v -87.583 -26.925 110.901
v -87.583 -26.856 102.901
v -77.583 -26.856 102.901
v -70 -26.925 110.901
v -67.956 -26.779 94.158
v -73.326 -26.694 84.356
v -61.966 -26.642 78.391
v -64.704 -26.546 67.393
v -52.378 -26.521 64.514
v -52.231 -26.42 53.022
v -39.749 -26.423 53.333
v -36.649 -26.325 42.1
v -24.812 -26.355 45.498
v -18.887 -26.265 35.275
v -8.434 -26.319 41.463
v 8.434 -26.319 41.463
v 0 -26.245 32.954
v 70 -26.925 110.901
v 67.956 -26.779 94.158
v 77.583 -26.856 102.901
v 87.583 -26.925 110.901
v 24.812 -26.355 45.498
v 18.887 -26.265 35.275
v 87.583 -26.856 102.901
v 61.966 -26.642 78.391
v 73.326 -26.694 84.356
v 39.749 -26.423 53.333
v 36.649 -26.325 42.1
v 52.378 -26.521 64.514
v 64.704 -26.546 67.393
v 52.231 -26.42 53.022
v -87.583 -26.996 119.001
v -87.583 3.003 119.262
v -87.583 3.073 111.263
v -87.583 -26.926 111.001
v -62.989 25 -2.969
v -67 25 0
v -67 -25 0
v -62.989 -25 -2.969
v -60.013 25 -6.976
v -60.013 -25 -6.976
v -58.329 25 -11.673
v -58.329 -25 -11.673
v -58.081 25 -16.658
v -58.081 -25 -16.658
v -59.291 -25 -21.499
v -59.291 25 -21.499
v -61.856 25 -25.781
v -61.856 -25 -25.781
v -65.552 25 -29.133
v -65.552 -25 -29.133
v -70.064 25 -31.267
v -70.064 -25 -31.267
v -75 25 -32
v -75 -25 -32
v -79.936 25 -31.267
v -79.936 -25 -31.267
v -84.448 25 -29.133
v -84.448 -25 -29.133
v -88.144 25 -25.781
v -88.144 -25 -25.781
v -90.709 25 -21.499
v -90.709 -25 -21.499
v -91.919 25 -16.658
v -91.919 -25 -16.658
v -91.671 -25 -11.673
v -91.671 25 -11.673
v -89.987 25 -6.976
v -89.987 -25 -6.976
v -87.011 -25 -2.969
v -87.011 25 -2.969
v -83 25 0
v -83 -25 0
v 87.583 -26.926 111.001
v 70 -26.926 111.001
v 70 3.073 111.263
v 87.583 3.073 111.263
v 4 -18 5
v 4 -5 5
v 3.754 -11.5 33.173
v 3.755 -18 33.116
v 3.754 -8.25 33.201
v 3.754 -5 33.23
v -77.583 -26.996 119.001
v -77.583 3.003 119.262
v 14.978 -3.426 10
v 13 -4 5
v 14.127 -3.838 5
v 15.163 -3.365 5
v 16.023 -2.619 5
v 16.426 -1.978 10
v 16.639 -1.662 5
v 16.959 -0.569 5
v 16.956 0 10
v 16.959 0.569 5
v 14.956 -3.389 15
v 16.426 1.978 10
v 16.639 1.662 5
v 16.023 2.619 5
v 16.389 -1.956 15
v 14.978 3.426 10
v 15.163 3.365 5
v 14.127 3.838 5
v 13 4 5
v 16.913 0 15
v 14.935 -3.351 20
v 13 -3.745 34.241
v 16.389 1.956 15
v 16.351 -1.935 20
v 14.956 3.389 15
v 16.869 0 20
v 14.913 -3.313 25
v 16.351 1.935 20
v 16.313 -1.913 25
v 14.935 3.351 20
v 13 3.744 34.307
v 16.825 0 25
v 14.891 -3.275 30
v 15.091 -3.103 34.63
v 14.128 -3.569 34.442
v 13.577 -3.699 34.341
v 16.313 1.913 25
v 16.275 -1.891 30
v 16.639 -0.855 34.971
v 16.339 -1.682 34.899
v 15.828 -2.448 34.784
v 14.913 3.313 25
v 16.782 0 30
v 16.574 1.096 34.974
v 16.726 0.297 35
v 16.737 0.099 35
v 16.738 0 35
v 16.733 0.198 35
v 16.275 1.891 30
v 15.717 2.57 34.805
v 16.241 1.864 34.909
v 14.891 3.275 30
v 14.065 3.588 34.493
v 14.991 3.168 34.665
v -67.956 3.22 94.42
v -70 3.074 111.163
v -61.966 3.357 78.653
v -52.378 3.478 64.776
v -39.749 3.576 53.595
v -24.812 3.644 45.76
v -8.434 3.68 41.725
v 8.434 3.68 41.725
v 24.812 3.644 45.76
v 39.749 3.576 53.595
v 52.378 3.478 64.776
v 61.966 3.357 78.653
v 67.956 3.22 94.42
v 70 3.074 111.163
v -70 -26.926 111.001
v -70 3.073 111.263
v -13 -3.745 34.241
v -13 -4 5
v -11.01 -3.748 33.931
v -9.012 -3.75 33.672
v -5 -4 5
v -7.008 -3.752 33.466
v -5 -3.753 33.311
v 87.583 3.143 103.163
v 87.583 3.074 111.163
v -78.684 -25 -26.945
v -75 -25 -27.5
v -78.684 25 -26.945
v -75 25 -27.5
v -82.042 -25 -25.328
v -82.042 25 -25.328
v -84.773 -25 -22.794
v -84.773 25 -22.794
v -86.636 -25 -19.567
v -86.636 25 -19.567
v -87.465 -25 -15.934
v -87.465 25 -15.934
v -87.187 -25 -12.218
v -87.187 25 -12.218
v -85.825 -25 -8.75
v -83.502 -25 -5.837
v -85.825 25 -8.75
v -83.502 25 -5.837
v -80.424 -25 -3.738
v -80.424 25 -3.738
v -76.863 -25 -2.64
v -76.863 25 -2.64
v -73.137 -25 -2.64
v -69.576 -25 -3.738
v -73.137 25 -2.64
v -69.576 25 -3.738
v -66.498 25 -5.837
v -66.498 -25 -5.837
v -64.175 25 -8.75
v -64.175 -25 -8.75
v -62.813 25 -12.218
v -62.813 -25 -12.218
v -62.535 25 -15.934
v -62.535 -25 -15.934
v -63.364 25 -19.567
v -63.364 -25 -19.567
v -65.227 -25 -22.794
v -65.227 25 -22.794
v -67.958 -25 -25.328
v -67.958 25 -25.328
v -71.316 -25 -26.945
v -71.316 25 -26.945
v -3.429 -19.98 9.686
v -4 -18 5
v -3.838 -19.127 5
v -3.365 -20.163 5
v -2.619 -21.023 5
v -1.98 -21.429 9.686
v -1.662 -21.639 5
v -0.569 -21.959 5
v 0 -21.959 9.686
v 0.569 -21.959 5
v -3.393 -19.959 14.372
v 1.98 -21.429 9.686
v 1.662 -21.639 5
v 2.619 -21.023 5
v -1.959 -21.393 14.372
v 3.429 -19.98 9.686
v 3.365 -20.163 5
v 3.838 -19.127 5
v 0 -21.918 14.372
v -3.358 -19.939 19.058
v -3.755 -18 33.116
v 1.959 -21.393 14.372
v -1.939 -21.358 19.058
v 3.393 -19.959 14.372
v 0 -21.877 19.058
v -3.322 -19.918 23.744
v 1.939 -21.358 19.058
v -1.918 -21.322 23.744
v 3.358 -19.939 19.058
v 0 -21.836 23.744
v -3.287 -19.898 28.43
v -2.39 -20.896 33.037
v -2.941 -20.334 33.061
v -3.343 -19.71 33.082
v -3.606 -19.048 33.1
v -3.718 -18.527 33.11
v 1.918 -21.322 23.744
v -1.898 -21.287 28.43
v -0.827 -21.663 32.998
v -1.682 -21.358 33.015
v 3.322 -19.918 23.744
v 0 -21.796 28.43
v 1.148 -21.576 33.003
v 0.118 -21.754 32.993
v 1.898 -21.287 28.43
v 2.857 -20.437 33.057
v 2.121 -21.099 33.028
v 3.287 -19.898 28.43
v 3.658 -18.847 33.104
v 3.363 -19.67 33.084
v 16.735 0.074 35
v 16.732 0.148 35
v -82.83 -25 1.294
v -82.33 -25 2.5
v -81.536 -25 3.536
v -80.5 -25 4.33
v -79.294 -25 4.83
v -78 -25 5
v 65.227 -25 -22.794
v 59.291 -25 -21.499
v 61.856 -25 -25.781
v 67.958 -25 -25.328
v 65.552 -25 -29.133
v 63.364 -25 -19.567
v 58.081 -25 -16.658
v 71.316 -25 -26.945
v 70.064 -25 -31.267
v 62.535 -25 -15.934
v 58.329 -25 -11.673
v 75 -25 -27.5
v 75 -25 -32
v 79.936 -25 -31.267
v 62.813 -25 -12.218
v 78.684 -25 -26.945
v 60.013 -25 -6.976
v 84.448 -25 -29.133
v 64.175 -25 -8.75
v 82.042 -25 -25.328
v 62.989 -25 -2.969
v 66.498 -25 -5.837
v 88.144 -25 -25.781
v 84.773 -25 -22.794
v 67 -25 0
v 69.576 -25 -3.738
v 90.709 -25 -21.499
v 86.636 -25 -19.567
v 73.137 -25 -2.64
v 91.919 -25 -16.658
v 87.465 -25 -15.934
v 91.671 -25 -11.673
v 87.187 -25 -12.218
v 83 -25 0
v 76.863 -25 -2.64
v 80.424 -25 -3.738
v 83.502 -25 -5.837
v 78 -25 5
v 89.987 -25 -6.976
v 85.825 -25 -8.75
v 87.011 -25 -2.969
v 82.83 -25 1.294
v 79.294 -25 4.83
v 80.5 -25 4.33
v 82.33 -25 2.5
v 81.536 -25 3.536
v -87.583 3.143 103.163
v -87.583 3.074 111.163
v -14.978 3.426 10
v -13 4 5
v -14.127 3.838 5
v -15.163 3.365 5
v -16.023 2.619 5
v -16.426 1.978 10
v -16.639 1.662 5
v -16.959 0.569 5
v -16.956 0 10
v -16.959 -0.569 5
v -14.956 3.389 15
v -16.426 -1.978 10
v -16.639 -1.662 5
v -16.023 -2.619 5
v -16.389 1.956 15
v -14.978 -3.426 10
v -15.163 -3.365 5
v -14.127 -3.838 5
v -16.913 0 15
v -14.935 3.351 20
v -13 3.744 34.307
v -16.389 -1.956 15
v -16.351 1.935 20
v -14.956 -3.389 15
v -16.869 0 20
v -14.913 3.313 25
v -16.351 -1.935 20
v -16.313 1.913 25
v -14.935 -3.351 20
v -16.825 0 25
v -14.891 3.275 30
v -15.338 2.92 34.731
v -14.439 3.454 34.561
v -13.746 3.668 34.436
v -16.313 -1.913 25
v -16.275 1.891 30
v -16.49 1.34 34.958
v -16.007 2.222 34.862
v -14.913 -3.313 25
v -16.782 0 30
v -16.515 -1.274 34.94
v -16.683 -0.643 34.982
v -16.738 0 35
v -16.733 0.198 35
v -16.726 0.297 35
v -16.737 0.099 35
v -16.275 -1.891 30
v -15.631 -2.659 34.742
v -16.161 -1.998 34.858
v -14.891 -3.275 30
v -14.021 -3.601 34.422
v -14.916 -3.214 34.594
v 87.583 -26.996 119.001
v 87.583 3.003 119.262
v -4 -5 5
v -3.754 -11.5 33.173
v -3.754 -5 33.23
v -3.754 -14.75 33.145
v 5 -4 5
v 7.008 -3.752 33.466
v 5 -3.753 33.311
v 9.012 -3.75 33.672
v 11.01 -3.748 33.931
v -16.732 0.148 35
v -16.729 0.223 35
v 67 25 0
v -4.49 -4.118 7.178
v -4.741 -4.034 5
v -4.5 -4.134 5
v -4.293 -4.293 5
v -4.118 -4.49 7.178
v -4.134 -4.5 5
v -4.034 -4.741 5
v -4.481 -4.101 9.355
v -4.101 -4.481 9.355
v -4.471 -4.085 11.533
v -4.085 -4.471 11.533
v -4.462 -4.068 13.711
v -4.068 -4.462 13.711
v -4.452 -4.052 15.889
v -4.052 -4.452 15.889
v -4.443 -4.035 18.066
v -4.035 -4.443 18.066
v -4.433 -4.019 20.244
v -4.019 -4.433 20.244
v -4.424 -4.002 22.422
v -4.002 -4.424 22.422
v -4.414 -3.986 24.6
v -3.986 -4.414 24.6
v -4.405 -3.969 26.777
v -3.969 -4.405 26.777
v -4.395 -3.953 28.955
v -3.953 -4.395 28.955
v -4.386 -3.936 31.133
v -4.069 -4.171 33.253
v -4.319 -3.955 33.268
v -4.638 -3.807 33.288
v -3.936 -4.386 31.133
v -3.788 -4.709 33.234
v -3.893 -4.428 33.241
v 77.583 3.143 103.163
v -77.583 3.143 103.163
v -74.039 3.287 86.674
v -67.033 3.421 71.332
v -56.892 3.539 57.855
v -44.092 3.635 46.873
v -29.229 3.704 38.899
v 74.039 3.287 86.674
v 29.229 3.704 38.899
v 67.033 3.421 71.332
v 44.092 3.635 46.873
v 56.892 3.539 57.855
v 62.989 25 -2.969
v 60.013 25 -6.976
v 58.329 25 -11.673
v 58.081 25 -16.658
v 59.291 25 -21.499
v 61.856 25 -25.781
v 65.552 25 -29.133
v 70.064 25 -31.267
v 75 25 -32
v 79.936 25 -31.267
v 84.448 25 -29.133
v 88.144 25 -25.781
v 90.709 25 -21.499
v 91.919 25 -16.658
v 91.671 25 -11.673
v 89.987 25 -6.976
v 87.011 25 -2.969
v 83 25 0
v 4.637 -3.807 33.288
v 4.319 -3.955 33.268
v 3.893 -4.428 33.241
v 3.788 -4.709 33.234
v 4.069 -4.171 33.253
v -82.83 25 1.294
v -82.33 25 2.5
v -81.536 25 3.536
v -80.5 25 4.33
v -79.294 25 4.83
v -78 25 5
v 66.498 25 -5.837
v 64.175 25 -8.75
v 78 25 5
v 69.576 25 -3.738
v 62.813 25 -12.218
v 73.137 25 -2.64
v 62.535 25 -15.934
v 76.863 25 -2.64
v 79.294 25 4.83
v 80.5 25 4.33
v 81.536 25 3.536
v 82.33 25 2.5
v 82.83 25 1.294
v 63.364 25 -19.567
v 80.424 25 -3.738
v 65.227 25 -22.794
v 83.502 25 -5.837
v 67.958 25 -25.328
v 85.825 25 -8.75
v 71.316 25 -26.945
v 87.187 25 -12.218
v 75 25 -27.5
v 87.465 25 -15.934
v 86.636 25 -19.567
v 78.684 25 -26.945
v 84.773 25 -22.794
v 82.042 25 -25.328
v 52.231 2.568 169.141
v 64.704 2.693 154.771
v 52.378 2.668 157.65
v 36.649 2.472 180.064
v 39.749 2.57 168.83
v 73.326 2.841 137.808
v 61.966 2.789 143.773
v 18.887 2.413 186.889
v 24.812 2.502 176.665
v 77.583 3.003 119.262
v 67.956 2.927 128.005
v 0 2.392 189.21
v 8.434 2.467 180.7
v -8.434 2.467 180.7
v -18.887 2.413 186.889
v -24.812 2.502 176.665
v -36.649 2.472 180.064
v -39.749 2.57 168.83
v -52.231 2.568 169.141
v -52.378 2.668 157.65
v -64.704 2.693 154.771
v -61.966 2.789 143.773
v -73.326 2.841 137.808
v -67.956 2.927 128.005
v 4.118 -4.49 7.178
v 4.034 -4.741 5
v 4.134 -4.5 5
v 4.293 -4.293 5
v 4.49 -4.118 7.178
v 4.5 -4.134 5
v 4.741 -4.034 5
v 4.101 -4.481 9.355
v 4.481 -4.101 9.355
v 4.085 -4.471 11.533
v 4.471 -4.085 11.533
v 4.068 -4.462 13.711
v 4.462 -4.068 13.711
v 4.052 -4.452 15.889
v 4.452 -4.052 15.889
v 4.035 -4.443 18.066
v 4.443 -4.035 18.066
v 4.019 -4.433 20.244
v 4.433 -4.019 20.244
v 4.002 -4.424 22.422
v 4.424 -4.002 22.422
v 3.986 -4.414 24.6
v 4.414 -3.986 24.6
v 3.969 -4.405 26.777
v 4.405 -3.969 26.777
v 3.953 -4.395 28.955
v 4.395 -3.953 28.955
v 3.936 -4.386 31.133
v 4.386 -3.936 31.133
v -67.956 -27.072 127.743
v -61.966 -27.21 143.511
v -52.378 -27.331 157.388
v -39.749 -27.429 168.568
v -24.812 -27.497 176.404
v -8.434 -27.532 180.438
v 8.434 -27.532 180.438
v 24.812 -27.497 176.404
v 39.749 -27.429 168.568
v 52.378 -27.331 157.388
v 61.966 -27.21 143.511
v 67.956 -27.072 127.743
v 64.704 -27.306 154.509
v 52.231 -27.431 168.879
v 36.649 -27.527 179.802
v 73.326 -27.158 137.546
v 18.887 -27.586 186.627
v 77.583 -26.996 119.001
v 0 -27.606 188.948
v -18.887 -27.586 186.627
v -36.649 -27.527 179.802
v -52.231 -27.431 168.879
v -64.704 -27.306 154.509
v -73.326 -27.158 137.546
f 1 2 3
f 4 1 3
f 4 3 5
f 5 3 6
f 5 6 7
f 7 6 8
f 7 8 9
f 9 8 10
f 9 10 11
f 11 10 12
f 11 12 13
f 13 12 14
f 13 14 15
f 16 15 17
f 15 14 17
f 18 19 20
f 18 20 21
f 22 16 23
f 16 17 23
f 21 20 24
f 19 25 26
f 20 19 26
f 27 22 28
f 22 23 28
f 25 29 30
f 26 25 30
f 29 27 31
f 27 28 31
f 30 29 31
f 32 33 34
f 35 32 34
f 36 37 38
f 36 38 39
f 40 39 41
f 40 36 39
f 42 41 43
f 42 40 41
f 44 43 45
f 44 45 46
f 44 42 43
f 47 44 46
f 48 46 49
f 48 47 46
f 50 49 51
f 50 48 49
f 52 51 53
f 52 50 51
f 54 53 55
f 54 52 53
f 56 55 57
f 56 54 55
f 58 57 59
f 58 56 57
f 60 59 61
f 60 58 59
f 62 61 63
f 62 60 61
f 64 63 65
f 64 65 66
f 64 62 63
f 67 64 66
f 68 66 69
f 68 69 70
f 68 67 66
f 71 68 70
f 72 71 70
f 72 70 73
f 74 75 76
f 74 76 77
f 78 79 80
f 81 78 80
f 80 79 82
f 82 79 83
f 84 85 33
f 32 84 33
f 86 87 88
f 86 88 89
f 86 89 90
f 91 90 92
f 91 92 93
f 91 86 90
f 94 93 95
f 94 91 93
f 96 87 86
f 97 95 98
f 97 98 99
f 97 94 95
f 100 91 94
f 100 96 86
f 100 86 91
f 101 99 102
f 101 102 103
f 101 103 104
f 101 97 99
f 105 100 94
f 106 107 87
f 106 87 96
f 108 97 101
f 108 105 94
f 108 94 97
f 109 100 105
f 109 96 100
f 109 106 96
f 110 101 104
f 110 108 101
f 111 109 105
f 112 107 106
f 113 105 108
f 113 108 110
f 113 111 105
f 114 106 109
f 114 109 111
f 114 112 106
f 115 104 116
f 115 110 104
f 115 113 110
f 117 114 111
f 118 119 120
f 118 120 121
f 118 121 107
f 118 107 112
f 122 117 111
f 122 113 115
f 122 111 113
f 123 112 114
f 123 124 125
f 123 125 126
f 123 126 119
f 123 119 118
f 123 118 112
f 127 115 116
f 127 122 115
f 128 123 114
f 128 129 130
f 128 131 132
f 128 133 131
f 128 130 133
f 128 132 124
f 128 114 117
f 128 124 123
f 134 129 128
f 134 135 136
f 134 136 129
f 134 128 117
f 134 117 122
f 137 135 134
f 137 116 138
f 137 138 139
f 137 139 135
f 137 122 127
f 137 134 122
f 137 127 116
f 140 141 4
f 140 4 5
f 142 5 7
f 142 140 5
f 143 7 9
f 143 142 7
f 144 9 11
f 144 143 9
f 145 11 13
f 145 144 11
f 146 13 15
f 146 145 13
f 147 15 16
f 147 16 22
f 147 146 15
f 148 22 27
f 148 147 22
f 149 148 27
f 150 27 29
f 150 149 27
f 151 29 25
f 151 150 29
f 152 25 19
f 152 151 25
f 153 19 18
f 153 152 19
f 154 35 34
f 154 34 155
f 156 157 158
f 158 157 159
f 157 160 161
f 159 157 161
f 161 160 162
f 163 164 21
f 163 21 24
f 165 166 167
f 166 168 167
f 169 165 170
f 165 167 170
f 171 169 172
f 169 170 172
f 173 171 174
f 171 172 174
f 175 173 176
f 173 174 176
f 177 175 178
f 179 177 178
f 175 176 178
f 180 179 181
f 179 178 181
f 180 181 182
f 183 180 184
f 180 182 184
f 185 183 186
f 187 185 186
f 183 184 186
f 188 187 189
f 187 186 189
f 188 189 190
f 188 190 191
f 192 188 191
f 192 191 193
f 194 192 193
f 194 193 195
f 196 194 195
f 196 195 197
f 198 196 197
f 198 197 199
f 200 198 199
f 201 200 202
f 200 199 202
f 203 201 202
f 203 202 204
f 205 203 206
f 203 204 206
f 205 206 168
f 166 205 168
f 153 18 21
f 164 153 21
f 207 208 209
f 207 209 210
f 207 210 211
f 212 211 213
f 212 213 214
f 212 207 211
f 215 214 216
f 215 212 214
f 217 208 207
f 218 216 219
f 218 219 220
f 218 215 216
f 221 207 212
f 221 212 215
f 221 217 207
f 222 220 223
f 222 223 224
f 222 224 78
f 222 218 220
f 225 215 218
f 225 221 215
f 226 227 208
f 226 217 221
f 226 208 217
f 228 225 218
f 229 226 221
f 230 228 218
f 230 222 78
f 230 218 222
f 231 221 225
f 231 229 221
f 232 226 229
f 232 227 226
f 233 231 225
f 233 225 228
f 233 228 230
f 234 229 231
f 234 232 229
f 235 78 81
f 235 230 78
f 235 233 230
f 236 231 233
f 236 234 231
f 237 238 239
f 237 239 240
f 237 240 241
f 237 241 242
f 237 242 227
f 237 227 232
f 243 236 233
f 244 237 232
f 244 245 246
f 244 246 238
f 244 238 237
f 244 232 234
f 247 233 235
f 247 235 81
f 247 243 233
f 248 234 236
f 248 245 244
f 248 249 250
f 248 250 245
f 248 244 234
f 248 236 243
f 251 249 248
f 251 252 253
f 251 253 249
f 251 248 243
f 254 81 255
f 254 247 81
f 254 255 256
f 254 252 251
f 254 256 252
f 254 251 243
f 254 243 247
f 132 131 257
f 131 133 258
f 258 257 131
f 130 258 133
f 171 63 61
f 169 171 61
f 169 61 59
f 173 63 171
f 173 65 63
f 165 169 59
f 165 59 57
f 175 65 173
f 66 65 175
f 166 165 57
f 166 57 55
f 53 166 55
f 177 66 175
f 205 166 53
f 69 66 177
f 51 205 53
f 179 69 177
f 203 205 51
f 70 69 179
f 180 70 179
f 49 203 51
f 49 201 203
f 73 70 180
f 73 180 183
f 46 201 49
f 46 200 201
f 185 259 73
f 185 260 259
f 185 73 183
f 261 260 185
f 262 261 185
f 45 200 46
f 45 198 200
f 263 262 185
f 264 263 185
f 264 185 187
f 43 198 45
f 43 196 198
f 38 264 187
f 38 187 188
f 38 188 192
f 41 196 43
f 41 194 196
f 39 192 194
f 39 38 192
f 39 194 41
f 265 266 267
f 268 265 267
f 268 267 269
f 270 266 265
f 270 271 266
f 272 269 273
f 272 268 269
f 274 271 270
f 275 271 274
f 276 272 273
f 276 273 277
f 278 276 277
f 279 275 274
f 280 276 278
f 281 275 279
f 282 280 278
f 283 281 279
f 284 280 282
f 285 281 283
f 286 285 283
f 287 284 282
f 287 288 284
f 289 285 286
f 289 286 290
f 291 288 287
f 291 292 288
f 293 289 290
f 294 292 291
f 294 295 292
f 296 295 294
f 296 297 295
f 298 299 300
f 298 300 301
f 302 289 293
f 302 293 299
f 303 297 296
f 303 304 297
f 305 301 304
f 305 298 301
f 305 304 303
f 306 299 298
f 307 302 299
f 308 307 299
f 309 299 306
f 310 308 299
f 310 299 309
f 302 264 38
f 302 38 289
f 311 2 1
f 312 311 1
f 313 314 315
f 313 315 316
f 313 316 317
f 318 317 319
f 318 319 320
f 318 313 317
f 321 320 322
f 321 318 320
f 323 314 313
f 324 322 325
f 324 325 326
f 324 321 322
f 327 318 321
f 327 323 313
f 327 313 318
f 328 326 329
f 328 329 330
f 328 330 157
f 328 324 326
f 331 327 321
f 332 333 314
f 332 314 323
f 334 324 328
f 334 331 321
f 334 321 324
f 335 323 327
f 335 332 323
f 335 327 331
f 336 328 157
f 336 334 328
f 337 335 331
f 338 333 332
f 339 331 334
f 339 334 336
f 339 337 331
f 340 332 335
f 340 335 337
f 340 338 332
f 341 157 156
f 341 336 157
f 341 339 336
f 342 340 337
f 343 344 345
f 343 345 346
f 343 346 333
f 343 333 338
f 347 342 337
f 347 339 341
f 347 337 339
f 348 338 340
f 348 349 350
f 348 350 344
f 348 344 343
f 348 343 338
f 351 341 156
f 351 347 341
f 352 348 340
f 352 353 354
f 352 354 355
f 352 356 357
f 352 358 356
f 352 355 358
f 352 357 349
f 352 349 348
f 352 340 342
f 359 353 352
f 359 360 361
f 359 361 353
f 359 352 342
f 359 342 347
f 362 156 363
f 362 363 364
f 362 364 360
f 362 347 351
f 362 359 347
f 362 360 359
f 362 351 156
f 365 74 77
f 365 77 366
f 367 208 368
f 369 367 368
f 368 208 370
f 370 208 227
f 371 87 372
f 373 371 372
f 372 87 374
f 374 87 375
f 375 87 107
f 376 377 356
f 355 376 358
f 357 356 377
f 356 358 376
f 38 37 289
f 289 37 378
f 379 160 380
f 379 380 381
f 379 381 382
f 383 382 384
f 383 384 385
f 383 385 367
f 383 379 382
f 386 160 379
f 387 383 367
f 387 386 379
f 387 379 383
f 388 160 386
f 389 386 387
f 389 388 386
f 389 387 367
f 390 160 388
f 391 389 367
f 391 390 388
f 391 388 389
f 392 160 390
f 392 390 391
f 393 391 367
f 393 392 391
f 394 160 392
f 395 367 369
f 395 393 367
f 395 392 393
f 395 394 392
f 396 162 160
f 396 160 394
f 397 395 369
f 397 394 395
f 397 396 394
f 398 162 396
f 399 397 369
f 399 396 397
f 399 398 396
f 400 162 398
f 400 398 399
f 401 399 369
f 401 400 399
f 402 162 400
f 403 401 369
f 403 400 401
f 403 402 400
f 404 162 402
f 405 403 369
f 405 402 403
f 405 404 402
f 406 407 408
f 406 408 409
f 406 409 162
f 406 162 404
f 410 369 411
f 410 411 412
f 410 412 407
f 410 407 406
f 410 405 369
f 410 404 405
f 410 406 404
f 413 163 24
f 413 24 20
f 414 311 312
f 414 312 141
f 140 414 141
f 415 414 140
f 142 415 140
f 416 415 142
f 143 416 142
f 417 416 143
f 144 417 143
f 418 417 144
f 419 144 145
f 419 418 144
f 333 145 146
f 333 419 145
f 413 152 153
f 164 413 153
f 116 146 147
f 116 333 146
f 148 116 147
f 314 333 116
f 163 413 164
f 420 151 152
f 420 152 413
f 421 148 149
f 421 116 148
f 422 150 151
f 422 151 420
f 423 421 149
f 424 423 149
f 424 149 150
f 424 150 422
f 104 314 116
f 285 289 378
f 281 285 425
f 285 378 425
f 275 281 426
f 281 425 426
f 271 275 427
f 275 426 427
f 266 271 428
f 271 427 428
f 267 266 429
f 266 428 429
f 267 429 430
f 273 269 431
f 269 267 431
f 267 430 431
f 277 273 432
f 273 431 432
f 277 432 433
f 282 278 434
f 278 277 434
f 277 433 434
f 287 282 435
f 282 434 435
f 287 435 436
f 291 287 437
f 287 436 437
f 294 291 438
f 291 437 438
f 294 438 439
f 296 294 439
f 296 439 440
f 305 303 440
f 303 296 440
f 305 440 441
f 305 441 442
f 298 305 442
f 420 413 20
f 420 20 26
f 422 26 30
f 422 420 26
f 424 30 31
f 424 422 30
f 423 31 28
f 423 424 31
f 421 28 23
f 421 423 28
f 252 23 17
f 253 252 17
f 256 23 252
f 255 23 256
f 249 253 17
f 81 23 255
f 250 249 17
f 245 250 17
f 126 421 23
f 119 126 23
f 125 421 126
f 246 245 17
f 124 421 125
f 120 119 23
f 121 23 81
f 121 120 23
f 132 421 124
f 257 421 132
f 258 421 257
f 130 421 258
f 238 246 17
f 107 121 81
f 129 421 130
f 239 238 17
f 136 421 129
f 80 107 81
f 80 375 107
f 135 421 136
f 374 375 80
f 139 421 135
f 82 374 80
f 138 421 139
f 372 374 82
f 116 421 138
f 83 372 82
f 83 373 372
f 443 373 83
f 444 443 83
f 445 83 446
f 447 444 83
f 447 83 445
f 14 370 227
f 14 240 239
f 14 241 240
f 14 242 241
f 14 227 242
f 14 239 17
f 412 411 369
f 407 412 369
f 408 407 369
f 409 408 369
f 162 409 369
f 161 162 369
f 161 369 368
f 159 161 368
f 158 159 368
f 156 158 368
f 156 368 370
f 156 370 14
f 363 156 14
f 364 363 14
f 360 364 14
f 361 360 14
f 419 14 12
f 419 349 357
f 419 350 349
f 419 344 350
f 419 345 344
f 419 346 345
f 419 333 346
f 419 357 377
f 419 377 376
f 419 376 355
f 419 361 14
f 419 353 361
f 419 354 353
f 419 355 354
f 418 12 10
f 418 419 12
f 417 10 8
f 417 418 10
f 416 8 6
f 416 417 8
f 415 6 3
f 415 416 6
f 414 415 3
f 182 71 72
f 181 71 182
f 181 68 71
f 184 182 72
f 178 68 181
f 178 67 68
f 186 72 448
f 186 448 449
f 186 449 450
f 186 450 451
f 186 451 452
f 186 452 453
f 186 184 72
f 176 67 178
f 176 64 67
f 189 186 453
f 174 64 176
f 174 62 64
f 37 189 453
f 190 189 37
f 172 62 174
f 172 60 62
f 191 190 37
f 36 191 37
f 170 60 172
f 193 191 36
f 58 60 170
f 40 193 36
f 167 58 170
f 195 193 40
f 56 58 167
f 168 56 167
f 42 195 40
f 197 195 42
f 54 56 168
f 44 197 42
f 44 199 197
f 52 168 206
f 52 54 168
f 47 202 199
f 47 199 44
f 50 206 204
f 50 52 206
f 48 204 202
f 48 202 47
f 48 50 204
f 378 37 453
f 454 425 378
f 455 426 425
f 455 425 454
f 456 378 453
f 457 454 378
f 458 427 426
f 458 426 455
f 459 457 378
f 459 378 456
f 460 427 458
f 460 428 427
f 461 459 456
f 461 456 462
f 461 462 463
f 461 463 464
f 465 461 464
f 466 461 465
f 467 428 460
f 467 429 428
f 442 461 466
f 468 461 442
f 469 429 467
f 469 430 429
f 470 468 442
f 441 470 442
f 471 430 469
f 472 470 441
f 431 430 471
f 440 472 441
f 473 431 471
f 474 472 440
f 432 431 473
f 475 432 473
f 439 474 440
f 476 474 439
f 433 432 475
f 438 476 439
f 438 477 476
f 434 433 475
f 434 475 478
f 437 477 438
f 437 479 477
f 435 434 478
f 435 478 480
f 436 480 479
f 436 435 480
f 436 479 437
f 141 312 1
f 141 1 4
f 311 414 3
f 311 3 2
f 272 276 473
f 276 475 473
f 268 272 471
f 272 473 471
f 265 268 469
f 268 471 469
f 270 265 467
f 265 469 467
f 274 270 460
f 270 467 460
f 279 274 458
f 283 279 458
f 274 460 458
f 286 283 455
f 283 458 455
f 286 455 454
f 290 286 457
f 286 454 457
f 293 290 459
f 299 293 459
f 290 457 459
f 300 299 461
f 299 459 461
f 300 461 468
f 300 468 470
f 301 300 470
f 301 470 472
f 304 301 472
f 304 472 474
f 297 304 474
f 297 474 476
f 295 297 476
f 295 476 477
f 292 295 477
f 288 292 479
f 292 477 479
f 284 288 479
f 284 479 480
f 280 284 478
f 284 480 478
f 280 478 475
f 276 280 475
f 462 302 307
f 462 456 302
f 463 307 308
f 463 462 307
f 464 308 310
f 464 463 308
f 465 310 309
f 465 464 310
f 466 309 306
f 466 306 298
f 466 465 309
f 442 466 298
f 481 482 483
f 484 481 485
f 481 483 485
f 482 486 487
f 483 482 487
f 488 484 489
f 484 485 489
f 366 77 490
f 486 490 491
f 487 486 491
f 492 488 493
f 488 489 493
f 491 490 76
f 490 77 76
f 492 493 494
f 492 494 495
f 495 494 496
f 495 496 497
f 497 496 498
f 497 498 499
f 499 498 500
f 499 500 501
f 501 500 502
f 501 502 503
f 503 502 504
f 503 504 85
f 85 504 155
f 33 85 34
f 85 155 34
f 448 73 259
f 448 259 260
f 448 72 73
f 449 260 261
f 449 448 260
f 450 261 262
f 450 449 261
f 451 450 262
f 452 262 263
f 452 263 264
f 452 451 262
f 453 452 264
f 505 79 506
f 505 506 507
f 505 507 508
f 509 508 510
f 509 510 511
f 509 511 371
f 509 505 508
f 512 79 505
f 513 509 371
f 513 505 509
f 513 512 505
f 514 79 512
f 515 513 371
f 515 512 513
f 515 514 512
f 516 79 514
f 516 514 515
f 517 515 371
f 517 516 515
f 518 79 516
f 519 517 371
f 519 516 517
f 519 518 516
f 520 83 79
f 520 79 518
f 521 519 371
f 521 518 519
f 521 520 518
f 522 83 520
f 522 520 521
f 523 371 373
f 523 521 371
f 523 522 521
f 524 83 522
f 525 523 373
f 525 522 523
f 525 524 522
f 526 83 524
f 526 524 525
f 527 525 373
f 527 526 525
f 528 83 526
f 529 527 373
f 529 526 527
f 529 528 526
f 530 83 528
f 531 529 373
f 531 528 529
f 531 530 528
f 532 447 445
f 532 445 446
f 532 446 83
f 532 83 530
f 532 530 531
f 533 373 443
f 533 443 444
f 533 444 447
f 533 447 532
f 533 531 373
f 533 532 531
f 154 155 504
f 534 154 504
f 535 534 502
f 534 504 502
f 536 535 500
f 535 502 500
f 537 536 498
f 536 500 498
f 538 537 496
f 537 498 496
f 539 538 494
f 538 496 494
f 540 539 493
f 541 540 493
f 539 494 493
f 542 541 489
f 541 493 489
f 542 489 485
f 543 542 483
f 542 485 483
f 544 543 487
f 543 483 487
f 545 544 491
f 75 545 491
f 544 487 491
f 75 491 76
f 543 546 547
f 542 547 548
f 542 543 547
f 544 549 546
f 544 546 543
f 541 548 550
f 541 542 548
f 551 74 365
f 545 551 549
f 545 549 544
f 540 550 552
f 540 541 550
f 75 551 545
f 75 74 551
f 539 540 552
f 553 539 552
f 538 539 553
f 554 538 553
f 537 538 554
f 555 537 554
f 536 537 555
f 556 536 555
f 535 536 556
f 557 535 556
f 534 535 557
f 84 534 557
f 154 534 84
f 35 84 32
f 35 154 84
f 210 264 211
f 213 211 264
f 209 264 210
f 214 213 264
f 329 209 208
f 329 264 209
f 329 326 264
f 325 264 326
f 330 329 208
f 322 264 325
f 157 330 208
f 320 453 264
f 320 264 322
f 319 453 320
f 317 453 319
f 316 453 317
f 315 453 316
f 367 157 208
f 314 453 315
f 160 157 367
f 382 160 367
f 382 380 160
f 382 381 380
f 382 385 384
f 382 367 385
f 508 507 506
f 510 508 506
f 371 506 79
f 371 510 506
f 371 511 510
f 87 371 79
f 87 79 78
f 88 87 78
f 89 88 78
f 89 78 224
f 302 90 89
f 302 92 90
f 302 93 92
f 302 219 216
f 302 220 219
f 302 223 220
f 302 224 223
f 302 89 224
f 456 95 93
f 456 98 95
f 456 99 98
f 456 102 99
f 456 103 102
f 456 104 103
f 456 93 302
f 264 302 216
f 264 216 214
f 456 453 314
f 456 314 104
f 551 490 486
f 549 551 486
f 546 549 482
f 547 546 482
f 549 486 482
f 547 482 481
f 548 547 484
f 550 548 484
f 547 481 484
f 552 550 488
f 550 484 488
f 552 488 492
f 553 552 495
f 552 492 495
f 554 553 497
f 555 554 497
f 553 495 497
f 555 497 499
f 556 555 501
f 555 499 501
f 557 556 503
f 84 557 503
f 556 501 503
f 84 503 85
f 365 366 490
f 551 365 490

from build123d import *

# Parameters (mm, degrees)
SKETCH_1_W                  = 166
SKETCH_1_H                  = 50
EXTRUDE_1_DEPTH             = 5
EXTRUDE_4_REACH             = 88.827
SKETCH_4_R                  = 12.5
EXTRUDE_4_DIRECTION_2_REACH = 88.827
FILLET_1_R                  = 5
EXTRUDE_2_DEPTH             = 30
EXTRUDE_2_TAPER             = 0.5
EXTRUDE_3_DEPTH             = 30


with BuildPart() as part:
    # Эскиз1 → Бобышка-Вытянуть1 (new body)
    with BuildSketch(Plane.XY):
        Rectangle(SKETCH_1_W, SKETCH_1_H)
    extrude(amount=EXTRUDE_1_DEPTH)

    # Бобышка-Вытянуть4: up to this face of the body (flat: up to its plane)
    extrude_4_end = Plane(part.part.faces().sort_by_distance((0, 25, 2.5))[0])
    # Эскиз4 → Бобышка-Вытянуть4 (add, up to the picked face)
    with BuildSketch(Plane(origin=(0, 0, 0), x_dir=(1, 0, 0), z_dir=(0, 1, 0)), mode=Mode.PRIVATE) as extrude_4_sk1:
        with BuildLine():
            Line((-83, 0), (-67, 0))
            ThreePointArc((-67, 0), (-75, 32), (-83, 0))
        make_face()
        with Locations(Location((-75, 15, 0), (0, 0, 90))):
            Circle(SKETCH_4_R, mode=Mode.SUBTRACT)
    extrude_4_tool1 = split(extrude(extrude_4_sk1.sketch, amount=EXTRUDE_4_REACH, mode=Mode.PRIVATE), bisect_by=extrude_4_end, keep=Keep.BOTH, mode=Mode.PRIVATE)
    # Эскиз4 → Бобышка-Вытянуть4 (add, up to the picked face)
    with BuildSketch(Plane(origin=(0, 0, 0), x_dir=(1, 0, 0), z_dir=(0, 1, 0)), mode=Mode.PRIVATE) as extrude_4_sk2:
        with BuildLine():
            Line((83, 0), (67, 0))
            ThreePointArc((67, 0), (75, 32), (83, 0))
        make_face()
        with Locations(Location((75, 15, 0), (0, 0, 90))):
            Circle(SKETCH_4_R, mode=Mode.SUBTRACT)
    extrude_4_tool2 = split(extrude(extrude_4_sk2.sketch, amount=EXTRUDE_4_REACH, mode=Mode.PRIVATE), bisect_by=extrude_4_end, keep=Keep.BOTH, mode=Mode.PRIVATE)
    add(extrude_4_tool1.solids().sort_by(Axis((-75, 0, -31.533095), (0, 1, 0)))[0])
    add(extrude_4_tool2.solids().sort_by(Axis((75, 0, -31.533095), (0, 1, 0)))[0])

    # Бобышка-Вытянуть4 direction 2: up to this face of the body (flat: up to its plane)
    extrude_4_direction_2_end = Plane(part.part.faces().sort_by_distance((0, -25, 2.5))[0])
    # Эскиз4 → Бобышка-Вытянуть4 direction 2 (add, up to the picked face)
    with BuildSketch(Plane(origin=(0, 0, 0), x_dir=(1, 0, 0), z_dir=(0, 1, 0)), mode=Mode.PRIVATE) as extrude_4_direction_2_sk1:
        with BuildLine():
            Line((-83, 0), (-67, 0))
            ThreePointArc((-67, 0), (-75, 32), (-83, 0))
        make_face()
        with Locations(Location((-75, 15, 0), (0, 0, 90))):
            Circle(SKETCH_4_R, mode=Mode.SUBTRACT)
    extrude_4_direction_2_tool1 = split(extrude(extrude_4_direction_2_sk1.sketch, amount=-EXTRUDE_4_DIRECTION_2_REACH, mode=Mode.PRIVATE), bisect_by=extrude_4_direction_2_end, keep=Keep.BOTH, mode=Mode.PRIVATE)
    # Эскиз4 → Бобышка-Вытянуть4 direction 2 (add, up to the picked face)
    with BuildSketch(Plane(origin=(0, 0, 0), x_dir=(1, 0, 0), z_dir=(0, 1, 0)), mode=Mode.PRIVATE) as extrude_4_direction_2_sk2:
        with BuildLine():
            Line((83, 0), (67, 0))
            ThreePointArc((67, 0), (75, 32), (83, 0))
        make_face()
        with Locations(Location((75, 15, 0), (0, 0, 90))):
            Circle(SKETCH_4_R, mode=Mode.SUBTRACT)
    extrude_4_direction_2_tool2 = split(extrude(extrude_4_direction_2_sk2.sketch, amount=-EXTRUDE_4_DIRECTION_2_REACH, mode=Mode.PRIVATE), bisect_by=extrude_4_direction_2_end, keep=Keep.BOTH, mode=Mode.PRIVATE)
    add(extrude_4_direction_2_tool1.solids().sort_by(Axis((-75, 0, -31.533095), (0, -1, 0)))[0])
    add(extrude_4_direction_2_tool2.solids().sort_by(Axis((75, 0, -31.533095), (0, -1, 0)))[0])

    # Скругление1
    fillet_1_edges = [part.edges().sort_by_distance(p)[0] for p in [
        (83, 0, 5),
        (-83, 0, 5),
    ]]
    fillet(fillet_1_edges, radius=FILLET_1_R - 0.0001)  # a hair under: the kernel refuses the full size

    # Эскиз2 → Бобышка-Вытянуть2 (add)
    with BuildSketch(Plane.XY.offset(5)):
        with BuildLine():
            ThreePointArc((-13, 4), (-17, 0), (-13, -4))
            Line((-13, -4), (-5, -4))
            ThreePointArc((-5, -4), (-4.292893219, -4.292893219), (-4, -5))
            Line((-4, -5), (-4, -18))
            ThreePointArc((-4, -18), (0, -22), (4, -18))
            Line((4, -18), (4, -5))
            ThreePointArc((4, -5), (4.292893219, -4.292893219), (5, -4))
            Line((5, -4), (13, -4))
            ThreePointArc((13, -4), (17, 0), (13, 4))
            Line((13, 4), (-13, 4))
        make_face()
    extrude(amount=EXTRUDE_2_DEPTH, taper=EXTRUDE_2_TAPER)

    # Эскиз3 → Бобышка-Вытянуть3 (add)
    with BuildSketch(Plane(origin=(0, 4.043326406, 0.035285575), x_dir=(1, 0, 0), z_dir=(0, 0.9999619230641713, 0.008726535498373954))):
        with BuildLine():
            Line((69.999982143, -111.131560673), (87.583487289, -111.131560673))
            Line((87.583487289, -111.131560673), (87.583487289, -103.131560673))
            Line((87.583487289, -103.131560673), (77.583487289, -103.131560673))
            ThreePointArc((77.583487289, -103.131560673), (0, -33.181560673), (-77.583487289, -103.131560673))
            Line((-77.583487289, -103.131560673), (-87.583487289, -103.131560673))
            Line((-87.583487289, -103.131560673), (-87.583487289, -111.131560673))
            Line((-87.583487289, -111.131560673), (-69.999982143, -111.131560673))
            ThreePointArc((-69.999982143, -111.131560673), (0, -41.181560673), (69.999982143, -111.131560673))
        make_face()
        with BuildLine():
            Line((-87.583487289, -111.231560673), (-69.999982143, -111.231560673))
            ThreePointArc((-69.999982143, -111.231560673), (0, -181.181560673), (69.999982143, -111.231560673))
            Line((69.999982143, -111.231560673), (87.583487289, -111.231560673))
            Line((87.583487289, -111.231560673), (87.583487289, -119.231560673))
            Line((87.583487289, -119.231560673), (77.583487289, -119.231560673))
            ThreePointArc((77.583487289, -119.231560673), (0, -189.181560673), (-77.583487289, -119.231560673))
            Line((-77.583487289, -119.231560673), (-87.583487289, -119.231560673))
            Line((-87.583487289, -119.231560673), (-87.583487289, -111.231560673))
        make_face()
    extrude(amount=-EXTRUDE_3_DEPTH)


with BuildPart() as extrude_3_piece_1:
    # of the separate pieces the step leaves, piece 1, a body of its own (extrude_3_pieces)
    add(part.part.solids().sort_by_distance((-83, 25, 0.0001))[0])


with BuildPart() as extrude_3_piece_2:
    # of the separate pieces the step leaves, piece 2, a body of its own (extrude_3_pieces)
    add(part.part.solids().sort_by_distance((-77.583487289, 3.00284796, 119.262306276))[0])


solid = Compound([extrude_3_piece_1.part, extrude_3_piece_2.part])
